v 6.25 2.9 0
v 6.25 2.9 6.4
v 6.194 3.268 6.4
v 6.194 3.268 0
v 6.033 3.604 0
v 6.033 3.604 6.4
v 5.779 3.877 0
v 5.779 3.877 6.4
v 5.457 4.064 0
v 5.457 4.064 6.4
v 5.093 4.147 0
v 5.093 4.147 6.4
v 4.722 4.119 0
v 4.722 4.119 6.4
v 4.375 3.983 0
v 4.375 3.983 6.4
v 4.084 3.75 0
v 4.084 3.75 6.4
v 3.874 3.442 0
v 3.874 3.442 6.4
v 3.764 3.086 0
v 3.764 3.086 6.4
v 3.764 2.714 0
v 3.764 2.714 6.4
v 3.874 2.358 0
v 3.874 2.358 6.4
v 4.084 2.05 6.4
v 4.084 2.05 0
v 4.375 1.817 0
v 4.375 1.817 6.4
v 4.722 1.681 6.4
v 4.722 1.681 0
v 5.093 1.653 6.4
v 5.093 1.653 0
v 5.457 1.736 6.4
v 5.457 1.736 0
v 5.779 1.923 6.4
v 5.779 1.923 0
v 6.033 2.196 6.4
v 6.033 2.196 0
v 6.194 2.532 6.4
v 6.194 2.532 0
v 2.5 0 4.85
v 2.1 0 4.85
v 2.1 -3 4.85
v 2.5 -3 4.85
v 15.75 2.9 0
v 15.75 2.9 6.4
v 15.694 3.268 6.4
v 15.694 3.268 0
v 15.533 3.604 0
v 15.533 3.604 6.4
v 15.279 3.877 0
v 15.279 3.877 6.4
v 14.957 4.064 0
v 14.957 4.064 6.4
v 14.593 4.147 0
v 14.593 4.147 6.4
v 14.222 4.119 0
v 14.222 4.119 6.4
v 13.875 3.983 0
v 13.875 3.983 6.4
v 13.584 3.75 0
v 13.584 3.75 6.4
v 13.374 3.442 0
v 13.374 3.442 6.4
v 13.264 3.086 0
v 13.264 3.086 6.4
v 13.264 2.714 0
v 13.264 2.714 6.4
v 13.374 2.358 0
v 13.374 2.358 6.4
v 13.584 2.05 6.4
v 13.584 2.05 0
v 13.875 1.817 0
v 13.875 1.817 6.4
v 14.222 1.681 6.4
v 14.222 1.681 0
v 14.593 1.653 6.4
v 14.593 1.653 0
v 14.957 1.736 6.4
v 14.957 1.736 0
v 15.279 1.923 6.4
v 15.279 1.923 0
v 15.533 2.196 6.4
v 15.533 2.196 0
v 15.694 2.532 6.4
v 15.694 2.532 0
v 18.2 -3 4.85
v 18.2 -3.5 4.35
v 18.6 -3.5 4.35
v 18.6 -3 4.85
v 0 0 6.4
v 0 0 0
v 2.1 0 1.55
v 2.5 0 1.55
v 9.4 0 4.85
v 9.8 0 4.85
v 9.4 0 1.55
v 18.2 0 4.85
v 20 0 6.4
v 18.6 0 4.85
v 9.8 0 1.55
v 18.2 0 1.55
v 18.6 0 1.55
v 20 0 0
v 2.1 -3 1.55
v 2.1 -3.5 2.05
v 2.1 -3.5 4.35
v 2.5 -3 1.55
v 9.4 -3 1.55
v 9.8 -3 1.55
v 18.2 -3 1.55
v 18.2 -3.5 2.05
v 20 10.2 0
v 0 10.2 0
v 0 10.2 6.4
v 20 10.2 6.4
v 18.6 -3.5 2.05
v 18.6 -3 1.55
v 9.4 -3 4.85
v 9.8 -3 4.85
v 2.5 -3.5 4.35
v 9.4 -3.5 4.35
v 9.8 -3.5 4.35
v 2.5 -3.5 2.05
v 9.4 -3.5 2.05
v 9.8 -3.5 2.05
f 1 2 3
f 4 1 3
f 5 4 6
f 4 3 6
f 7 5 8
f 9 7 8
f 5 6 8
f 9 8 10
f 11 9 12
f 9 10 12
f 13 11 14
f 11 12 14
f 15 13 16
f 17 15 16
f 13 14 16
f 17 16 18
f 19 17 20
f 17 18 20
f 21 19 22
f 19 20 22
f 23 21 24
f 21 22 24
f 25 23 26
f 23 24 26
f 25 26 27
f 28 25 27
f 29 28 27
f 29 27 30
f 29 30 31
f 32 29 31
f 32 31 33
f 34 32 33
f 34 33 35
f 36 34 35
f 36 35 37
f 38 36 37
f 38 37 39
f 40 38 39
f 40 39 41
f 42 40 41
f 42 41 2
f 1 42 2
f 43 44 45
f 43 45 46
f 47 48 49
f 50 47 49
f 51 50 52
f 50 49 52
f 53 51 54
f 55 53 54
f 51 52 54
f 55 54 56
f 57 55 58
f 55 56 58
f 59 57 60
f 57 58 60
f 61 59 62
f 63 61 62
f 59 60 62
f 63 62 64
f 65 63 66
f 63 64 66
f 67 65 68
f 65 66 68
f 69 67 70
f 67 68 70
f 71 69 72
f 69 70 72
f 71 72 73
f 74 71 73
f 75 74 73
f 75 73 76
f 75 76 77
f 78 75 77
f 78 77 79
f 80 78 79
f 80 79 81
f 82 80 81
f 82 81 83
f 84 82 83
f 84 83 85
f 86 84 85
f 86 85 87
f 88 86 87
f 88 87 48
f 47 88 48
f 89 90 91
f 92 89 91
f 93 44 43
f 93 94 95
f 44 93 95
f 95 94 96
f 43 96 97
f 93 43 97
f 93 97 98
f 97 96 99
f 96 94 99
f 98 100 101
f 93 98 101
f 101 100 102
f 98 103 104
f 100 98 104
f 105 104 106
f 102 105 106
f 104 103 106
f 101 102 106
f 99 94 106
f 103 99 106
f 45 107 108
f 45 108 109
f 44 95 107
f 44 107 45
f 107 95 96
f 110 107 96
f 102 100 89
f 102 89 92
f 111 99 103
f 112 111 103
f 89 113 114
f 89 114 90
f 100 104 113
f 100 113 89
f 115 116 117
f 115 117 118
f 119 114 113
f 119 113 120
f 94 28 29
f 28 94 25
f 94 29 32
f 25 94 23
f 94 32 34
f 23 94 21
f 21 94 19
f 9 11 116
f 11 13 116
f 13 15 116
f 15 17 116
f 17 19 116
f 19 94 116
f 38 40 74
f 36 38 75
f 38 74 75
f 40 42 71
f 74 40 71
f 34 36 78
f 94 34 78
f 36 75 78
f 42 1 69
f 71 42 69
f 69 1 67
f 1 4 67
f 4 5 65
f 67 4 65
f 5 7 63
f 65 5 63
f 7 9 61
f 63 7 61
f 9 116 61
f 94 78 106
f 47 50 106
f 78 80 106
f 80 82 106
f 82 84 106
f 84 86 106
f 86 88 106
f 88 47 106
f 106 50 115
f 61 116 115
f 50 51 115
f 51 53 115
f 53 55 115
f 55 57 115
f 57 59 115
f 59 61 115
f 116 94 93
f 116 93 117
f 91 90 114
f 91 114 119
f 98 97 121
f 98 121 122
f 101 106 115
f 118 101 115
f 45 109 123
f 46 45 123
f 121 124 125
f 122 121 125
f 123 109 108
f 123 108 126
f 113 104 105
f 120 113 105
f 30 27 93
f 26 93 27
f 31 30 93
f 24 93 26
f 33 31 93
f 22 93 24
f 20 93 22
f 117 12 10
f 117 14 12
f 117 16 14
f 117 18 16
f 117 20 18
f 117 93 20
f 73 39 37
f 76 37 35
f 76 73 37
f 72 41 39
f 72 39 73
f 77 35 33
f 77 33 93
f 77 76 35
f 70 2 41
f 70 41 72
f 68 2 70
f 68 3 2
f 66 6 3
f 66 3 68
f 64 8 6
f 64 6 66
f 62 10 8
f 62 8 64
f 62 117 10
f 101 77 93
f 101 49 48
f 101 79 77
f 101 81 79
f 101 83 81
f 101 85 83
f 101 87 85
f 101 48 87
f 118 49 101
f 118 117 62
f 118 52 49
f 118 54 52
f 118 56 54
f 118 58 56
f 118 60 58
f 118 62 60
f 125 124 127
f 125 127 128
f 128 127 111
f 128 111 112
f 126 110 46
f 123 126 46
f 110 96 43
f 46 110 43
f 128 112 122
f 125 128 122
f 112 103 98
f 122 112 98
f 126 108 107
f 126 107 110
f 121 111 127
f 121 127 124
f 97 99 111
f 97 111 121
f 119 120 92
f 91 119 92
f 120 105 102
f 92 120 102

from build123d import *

# Parameters (mm, degrees)
SKETCH1_W           = 20
SKETCH1_H           = 10.2
BOSS_EXTRUDE1_DEPTH = 6.4
SKETCH2_W           = 0.4
SKETCH2_H           = 3.3
BOSS_EXTRUDE2_DEPTH = 3.5
CUT_EXTRUDE1_REACH  = 8.4
SKETCH3_R           = 1.25
CHAMFER1_SIZE       = 0.5


with BuildPart() as part:
    # Sketch1 → Boss-Extrude1 (new body)
    with BuildSketch(Plane.XY):
        with Locations((10, 5.1)):
            Rectangle(SKETCH1_W, SKETCH1_H)
    extrude(amount=BOSS_EXTRUDE1_DEPTH)

    # Sketch2 → Boss-Extrude2 (add)
    with BuildSketch(Plane.XZ):
        with Locations((18.4, 3.2)):
            Rectangle(SKETCH2_W, SKETCH2_H)
        with Locations((9.6, 3.2)):
            Rectangle(SKETCH2_W, SKETCH2_H)
        with Locations((2.3, 3.2)):
            Rectangle(SKETCH2_W, SKETCH2_H)
    extrude(amount=BOSS_EXTRUDE2_DEPTH)

    # Sketch3 → Cut-Extrude1 (cut, up to next)
    with BuildSketch(Plane.XY.offset(6.4), mode=Mode.PRIVATE) as cut_extrude1_sk1:
        with Locations((14.5, 2.9)):
            Circle(SKETCH3_R)
    cut_extrude1_tool1 = extrude(cut_extrude1_sk1.sketch, amount=-CUT_EXTRUDE1_REACH, mode=Mode.PRIVATE) & part.part
    add(cut_extrude1_tool1.solids().sort_by_distance((14.5, 2.9, 6.4))[0], mode=Mode.SUBTRACT)
    # Sketch3 → Cut-Extrude1 (cut, up to next)
    with BuildSketch(Plane.XY.offset(6.4), mode=Mode.PRIVATE) as cut_extrude1_sk2:
        with Locations((5, 2.9)):
            Circle(SKETCH3_R)
    cut_extrude1_tool2 = extrude(cut_extrude1_sk2.sketch, amount=-CUT_EXTRUDE1_REACH, mode=Mode.PRIVATE) & part.part
    add(cut_extrude1_tool2.solids().sort_by_distance((5, 2.9, 6.4))[0], mode=Mode.SUBTRACT)

    # Chamfer1
    chamfer1_edges = [part.edges().sort_by_distance(p)[0] for p in [
        (18.4, -3.5, 1.55),
        (18.4, -3.5, 4.85),
        (9.6, -3.5, 1.55),
        (9.6, -3.5, 4.85),
        (2.3, -3.5, 1.55),
        (2.3, -3.5, 4.85),
    ]]
    chamfer(chamfer1_edges, length=CHAMFER1_SIZE)


solid = part.part
